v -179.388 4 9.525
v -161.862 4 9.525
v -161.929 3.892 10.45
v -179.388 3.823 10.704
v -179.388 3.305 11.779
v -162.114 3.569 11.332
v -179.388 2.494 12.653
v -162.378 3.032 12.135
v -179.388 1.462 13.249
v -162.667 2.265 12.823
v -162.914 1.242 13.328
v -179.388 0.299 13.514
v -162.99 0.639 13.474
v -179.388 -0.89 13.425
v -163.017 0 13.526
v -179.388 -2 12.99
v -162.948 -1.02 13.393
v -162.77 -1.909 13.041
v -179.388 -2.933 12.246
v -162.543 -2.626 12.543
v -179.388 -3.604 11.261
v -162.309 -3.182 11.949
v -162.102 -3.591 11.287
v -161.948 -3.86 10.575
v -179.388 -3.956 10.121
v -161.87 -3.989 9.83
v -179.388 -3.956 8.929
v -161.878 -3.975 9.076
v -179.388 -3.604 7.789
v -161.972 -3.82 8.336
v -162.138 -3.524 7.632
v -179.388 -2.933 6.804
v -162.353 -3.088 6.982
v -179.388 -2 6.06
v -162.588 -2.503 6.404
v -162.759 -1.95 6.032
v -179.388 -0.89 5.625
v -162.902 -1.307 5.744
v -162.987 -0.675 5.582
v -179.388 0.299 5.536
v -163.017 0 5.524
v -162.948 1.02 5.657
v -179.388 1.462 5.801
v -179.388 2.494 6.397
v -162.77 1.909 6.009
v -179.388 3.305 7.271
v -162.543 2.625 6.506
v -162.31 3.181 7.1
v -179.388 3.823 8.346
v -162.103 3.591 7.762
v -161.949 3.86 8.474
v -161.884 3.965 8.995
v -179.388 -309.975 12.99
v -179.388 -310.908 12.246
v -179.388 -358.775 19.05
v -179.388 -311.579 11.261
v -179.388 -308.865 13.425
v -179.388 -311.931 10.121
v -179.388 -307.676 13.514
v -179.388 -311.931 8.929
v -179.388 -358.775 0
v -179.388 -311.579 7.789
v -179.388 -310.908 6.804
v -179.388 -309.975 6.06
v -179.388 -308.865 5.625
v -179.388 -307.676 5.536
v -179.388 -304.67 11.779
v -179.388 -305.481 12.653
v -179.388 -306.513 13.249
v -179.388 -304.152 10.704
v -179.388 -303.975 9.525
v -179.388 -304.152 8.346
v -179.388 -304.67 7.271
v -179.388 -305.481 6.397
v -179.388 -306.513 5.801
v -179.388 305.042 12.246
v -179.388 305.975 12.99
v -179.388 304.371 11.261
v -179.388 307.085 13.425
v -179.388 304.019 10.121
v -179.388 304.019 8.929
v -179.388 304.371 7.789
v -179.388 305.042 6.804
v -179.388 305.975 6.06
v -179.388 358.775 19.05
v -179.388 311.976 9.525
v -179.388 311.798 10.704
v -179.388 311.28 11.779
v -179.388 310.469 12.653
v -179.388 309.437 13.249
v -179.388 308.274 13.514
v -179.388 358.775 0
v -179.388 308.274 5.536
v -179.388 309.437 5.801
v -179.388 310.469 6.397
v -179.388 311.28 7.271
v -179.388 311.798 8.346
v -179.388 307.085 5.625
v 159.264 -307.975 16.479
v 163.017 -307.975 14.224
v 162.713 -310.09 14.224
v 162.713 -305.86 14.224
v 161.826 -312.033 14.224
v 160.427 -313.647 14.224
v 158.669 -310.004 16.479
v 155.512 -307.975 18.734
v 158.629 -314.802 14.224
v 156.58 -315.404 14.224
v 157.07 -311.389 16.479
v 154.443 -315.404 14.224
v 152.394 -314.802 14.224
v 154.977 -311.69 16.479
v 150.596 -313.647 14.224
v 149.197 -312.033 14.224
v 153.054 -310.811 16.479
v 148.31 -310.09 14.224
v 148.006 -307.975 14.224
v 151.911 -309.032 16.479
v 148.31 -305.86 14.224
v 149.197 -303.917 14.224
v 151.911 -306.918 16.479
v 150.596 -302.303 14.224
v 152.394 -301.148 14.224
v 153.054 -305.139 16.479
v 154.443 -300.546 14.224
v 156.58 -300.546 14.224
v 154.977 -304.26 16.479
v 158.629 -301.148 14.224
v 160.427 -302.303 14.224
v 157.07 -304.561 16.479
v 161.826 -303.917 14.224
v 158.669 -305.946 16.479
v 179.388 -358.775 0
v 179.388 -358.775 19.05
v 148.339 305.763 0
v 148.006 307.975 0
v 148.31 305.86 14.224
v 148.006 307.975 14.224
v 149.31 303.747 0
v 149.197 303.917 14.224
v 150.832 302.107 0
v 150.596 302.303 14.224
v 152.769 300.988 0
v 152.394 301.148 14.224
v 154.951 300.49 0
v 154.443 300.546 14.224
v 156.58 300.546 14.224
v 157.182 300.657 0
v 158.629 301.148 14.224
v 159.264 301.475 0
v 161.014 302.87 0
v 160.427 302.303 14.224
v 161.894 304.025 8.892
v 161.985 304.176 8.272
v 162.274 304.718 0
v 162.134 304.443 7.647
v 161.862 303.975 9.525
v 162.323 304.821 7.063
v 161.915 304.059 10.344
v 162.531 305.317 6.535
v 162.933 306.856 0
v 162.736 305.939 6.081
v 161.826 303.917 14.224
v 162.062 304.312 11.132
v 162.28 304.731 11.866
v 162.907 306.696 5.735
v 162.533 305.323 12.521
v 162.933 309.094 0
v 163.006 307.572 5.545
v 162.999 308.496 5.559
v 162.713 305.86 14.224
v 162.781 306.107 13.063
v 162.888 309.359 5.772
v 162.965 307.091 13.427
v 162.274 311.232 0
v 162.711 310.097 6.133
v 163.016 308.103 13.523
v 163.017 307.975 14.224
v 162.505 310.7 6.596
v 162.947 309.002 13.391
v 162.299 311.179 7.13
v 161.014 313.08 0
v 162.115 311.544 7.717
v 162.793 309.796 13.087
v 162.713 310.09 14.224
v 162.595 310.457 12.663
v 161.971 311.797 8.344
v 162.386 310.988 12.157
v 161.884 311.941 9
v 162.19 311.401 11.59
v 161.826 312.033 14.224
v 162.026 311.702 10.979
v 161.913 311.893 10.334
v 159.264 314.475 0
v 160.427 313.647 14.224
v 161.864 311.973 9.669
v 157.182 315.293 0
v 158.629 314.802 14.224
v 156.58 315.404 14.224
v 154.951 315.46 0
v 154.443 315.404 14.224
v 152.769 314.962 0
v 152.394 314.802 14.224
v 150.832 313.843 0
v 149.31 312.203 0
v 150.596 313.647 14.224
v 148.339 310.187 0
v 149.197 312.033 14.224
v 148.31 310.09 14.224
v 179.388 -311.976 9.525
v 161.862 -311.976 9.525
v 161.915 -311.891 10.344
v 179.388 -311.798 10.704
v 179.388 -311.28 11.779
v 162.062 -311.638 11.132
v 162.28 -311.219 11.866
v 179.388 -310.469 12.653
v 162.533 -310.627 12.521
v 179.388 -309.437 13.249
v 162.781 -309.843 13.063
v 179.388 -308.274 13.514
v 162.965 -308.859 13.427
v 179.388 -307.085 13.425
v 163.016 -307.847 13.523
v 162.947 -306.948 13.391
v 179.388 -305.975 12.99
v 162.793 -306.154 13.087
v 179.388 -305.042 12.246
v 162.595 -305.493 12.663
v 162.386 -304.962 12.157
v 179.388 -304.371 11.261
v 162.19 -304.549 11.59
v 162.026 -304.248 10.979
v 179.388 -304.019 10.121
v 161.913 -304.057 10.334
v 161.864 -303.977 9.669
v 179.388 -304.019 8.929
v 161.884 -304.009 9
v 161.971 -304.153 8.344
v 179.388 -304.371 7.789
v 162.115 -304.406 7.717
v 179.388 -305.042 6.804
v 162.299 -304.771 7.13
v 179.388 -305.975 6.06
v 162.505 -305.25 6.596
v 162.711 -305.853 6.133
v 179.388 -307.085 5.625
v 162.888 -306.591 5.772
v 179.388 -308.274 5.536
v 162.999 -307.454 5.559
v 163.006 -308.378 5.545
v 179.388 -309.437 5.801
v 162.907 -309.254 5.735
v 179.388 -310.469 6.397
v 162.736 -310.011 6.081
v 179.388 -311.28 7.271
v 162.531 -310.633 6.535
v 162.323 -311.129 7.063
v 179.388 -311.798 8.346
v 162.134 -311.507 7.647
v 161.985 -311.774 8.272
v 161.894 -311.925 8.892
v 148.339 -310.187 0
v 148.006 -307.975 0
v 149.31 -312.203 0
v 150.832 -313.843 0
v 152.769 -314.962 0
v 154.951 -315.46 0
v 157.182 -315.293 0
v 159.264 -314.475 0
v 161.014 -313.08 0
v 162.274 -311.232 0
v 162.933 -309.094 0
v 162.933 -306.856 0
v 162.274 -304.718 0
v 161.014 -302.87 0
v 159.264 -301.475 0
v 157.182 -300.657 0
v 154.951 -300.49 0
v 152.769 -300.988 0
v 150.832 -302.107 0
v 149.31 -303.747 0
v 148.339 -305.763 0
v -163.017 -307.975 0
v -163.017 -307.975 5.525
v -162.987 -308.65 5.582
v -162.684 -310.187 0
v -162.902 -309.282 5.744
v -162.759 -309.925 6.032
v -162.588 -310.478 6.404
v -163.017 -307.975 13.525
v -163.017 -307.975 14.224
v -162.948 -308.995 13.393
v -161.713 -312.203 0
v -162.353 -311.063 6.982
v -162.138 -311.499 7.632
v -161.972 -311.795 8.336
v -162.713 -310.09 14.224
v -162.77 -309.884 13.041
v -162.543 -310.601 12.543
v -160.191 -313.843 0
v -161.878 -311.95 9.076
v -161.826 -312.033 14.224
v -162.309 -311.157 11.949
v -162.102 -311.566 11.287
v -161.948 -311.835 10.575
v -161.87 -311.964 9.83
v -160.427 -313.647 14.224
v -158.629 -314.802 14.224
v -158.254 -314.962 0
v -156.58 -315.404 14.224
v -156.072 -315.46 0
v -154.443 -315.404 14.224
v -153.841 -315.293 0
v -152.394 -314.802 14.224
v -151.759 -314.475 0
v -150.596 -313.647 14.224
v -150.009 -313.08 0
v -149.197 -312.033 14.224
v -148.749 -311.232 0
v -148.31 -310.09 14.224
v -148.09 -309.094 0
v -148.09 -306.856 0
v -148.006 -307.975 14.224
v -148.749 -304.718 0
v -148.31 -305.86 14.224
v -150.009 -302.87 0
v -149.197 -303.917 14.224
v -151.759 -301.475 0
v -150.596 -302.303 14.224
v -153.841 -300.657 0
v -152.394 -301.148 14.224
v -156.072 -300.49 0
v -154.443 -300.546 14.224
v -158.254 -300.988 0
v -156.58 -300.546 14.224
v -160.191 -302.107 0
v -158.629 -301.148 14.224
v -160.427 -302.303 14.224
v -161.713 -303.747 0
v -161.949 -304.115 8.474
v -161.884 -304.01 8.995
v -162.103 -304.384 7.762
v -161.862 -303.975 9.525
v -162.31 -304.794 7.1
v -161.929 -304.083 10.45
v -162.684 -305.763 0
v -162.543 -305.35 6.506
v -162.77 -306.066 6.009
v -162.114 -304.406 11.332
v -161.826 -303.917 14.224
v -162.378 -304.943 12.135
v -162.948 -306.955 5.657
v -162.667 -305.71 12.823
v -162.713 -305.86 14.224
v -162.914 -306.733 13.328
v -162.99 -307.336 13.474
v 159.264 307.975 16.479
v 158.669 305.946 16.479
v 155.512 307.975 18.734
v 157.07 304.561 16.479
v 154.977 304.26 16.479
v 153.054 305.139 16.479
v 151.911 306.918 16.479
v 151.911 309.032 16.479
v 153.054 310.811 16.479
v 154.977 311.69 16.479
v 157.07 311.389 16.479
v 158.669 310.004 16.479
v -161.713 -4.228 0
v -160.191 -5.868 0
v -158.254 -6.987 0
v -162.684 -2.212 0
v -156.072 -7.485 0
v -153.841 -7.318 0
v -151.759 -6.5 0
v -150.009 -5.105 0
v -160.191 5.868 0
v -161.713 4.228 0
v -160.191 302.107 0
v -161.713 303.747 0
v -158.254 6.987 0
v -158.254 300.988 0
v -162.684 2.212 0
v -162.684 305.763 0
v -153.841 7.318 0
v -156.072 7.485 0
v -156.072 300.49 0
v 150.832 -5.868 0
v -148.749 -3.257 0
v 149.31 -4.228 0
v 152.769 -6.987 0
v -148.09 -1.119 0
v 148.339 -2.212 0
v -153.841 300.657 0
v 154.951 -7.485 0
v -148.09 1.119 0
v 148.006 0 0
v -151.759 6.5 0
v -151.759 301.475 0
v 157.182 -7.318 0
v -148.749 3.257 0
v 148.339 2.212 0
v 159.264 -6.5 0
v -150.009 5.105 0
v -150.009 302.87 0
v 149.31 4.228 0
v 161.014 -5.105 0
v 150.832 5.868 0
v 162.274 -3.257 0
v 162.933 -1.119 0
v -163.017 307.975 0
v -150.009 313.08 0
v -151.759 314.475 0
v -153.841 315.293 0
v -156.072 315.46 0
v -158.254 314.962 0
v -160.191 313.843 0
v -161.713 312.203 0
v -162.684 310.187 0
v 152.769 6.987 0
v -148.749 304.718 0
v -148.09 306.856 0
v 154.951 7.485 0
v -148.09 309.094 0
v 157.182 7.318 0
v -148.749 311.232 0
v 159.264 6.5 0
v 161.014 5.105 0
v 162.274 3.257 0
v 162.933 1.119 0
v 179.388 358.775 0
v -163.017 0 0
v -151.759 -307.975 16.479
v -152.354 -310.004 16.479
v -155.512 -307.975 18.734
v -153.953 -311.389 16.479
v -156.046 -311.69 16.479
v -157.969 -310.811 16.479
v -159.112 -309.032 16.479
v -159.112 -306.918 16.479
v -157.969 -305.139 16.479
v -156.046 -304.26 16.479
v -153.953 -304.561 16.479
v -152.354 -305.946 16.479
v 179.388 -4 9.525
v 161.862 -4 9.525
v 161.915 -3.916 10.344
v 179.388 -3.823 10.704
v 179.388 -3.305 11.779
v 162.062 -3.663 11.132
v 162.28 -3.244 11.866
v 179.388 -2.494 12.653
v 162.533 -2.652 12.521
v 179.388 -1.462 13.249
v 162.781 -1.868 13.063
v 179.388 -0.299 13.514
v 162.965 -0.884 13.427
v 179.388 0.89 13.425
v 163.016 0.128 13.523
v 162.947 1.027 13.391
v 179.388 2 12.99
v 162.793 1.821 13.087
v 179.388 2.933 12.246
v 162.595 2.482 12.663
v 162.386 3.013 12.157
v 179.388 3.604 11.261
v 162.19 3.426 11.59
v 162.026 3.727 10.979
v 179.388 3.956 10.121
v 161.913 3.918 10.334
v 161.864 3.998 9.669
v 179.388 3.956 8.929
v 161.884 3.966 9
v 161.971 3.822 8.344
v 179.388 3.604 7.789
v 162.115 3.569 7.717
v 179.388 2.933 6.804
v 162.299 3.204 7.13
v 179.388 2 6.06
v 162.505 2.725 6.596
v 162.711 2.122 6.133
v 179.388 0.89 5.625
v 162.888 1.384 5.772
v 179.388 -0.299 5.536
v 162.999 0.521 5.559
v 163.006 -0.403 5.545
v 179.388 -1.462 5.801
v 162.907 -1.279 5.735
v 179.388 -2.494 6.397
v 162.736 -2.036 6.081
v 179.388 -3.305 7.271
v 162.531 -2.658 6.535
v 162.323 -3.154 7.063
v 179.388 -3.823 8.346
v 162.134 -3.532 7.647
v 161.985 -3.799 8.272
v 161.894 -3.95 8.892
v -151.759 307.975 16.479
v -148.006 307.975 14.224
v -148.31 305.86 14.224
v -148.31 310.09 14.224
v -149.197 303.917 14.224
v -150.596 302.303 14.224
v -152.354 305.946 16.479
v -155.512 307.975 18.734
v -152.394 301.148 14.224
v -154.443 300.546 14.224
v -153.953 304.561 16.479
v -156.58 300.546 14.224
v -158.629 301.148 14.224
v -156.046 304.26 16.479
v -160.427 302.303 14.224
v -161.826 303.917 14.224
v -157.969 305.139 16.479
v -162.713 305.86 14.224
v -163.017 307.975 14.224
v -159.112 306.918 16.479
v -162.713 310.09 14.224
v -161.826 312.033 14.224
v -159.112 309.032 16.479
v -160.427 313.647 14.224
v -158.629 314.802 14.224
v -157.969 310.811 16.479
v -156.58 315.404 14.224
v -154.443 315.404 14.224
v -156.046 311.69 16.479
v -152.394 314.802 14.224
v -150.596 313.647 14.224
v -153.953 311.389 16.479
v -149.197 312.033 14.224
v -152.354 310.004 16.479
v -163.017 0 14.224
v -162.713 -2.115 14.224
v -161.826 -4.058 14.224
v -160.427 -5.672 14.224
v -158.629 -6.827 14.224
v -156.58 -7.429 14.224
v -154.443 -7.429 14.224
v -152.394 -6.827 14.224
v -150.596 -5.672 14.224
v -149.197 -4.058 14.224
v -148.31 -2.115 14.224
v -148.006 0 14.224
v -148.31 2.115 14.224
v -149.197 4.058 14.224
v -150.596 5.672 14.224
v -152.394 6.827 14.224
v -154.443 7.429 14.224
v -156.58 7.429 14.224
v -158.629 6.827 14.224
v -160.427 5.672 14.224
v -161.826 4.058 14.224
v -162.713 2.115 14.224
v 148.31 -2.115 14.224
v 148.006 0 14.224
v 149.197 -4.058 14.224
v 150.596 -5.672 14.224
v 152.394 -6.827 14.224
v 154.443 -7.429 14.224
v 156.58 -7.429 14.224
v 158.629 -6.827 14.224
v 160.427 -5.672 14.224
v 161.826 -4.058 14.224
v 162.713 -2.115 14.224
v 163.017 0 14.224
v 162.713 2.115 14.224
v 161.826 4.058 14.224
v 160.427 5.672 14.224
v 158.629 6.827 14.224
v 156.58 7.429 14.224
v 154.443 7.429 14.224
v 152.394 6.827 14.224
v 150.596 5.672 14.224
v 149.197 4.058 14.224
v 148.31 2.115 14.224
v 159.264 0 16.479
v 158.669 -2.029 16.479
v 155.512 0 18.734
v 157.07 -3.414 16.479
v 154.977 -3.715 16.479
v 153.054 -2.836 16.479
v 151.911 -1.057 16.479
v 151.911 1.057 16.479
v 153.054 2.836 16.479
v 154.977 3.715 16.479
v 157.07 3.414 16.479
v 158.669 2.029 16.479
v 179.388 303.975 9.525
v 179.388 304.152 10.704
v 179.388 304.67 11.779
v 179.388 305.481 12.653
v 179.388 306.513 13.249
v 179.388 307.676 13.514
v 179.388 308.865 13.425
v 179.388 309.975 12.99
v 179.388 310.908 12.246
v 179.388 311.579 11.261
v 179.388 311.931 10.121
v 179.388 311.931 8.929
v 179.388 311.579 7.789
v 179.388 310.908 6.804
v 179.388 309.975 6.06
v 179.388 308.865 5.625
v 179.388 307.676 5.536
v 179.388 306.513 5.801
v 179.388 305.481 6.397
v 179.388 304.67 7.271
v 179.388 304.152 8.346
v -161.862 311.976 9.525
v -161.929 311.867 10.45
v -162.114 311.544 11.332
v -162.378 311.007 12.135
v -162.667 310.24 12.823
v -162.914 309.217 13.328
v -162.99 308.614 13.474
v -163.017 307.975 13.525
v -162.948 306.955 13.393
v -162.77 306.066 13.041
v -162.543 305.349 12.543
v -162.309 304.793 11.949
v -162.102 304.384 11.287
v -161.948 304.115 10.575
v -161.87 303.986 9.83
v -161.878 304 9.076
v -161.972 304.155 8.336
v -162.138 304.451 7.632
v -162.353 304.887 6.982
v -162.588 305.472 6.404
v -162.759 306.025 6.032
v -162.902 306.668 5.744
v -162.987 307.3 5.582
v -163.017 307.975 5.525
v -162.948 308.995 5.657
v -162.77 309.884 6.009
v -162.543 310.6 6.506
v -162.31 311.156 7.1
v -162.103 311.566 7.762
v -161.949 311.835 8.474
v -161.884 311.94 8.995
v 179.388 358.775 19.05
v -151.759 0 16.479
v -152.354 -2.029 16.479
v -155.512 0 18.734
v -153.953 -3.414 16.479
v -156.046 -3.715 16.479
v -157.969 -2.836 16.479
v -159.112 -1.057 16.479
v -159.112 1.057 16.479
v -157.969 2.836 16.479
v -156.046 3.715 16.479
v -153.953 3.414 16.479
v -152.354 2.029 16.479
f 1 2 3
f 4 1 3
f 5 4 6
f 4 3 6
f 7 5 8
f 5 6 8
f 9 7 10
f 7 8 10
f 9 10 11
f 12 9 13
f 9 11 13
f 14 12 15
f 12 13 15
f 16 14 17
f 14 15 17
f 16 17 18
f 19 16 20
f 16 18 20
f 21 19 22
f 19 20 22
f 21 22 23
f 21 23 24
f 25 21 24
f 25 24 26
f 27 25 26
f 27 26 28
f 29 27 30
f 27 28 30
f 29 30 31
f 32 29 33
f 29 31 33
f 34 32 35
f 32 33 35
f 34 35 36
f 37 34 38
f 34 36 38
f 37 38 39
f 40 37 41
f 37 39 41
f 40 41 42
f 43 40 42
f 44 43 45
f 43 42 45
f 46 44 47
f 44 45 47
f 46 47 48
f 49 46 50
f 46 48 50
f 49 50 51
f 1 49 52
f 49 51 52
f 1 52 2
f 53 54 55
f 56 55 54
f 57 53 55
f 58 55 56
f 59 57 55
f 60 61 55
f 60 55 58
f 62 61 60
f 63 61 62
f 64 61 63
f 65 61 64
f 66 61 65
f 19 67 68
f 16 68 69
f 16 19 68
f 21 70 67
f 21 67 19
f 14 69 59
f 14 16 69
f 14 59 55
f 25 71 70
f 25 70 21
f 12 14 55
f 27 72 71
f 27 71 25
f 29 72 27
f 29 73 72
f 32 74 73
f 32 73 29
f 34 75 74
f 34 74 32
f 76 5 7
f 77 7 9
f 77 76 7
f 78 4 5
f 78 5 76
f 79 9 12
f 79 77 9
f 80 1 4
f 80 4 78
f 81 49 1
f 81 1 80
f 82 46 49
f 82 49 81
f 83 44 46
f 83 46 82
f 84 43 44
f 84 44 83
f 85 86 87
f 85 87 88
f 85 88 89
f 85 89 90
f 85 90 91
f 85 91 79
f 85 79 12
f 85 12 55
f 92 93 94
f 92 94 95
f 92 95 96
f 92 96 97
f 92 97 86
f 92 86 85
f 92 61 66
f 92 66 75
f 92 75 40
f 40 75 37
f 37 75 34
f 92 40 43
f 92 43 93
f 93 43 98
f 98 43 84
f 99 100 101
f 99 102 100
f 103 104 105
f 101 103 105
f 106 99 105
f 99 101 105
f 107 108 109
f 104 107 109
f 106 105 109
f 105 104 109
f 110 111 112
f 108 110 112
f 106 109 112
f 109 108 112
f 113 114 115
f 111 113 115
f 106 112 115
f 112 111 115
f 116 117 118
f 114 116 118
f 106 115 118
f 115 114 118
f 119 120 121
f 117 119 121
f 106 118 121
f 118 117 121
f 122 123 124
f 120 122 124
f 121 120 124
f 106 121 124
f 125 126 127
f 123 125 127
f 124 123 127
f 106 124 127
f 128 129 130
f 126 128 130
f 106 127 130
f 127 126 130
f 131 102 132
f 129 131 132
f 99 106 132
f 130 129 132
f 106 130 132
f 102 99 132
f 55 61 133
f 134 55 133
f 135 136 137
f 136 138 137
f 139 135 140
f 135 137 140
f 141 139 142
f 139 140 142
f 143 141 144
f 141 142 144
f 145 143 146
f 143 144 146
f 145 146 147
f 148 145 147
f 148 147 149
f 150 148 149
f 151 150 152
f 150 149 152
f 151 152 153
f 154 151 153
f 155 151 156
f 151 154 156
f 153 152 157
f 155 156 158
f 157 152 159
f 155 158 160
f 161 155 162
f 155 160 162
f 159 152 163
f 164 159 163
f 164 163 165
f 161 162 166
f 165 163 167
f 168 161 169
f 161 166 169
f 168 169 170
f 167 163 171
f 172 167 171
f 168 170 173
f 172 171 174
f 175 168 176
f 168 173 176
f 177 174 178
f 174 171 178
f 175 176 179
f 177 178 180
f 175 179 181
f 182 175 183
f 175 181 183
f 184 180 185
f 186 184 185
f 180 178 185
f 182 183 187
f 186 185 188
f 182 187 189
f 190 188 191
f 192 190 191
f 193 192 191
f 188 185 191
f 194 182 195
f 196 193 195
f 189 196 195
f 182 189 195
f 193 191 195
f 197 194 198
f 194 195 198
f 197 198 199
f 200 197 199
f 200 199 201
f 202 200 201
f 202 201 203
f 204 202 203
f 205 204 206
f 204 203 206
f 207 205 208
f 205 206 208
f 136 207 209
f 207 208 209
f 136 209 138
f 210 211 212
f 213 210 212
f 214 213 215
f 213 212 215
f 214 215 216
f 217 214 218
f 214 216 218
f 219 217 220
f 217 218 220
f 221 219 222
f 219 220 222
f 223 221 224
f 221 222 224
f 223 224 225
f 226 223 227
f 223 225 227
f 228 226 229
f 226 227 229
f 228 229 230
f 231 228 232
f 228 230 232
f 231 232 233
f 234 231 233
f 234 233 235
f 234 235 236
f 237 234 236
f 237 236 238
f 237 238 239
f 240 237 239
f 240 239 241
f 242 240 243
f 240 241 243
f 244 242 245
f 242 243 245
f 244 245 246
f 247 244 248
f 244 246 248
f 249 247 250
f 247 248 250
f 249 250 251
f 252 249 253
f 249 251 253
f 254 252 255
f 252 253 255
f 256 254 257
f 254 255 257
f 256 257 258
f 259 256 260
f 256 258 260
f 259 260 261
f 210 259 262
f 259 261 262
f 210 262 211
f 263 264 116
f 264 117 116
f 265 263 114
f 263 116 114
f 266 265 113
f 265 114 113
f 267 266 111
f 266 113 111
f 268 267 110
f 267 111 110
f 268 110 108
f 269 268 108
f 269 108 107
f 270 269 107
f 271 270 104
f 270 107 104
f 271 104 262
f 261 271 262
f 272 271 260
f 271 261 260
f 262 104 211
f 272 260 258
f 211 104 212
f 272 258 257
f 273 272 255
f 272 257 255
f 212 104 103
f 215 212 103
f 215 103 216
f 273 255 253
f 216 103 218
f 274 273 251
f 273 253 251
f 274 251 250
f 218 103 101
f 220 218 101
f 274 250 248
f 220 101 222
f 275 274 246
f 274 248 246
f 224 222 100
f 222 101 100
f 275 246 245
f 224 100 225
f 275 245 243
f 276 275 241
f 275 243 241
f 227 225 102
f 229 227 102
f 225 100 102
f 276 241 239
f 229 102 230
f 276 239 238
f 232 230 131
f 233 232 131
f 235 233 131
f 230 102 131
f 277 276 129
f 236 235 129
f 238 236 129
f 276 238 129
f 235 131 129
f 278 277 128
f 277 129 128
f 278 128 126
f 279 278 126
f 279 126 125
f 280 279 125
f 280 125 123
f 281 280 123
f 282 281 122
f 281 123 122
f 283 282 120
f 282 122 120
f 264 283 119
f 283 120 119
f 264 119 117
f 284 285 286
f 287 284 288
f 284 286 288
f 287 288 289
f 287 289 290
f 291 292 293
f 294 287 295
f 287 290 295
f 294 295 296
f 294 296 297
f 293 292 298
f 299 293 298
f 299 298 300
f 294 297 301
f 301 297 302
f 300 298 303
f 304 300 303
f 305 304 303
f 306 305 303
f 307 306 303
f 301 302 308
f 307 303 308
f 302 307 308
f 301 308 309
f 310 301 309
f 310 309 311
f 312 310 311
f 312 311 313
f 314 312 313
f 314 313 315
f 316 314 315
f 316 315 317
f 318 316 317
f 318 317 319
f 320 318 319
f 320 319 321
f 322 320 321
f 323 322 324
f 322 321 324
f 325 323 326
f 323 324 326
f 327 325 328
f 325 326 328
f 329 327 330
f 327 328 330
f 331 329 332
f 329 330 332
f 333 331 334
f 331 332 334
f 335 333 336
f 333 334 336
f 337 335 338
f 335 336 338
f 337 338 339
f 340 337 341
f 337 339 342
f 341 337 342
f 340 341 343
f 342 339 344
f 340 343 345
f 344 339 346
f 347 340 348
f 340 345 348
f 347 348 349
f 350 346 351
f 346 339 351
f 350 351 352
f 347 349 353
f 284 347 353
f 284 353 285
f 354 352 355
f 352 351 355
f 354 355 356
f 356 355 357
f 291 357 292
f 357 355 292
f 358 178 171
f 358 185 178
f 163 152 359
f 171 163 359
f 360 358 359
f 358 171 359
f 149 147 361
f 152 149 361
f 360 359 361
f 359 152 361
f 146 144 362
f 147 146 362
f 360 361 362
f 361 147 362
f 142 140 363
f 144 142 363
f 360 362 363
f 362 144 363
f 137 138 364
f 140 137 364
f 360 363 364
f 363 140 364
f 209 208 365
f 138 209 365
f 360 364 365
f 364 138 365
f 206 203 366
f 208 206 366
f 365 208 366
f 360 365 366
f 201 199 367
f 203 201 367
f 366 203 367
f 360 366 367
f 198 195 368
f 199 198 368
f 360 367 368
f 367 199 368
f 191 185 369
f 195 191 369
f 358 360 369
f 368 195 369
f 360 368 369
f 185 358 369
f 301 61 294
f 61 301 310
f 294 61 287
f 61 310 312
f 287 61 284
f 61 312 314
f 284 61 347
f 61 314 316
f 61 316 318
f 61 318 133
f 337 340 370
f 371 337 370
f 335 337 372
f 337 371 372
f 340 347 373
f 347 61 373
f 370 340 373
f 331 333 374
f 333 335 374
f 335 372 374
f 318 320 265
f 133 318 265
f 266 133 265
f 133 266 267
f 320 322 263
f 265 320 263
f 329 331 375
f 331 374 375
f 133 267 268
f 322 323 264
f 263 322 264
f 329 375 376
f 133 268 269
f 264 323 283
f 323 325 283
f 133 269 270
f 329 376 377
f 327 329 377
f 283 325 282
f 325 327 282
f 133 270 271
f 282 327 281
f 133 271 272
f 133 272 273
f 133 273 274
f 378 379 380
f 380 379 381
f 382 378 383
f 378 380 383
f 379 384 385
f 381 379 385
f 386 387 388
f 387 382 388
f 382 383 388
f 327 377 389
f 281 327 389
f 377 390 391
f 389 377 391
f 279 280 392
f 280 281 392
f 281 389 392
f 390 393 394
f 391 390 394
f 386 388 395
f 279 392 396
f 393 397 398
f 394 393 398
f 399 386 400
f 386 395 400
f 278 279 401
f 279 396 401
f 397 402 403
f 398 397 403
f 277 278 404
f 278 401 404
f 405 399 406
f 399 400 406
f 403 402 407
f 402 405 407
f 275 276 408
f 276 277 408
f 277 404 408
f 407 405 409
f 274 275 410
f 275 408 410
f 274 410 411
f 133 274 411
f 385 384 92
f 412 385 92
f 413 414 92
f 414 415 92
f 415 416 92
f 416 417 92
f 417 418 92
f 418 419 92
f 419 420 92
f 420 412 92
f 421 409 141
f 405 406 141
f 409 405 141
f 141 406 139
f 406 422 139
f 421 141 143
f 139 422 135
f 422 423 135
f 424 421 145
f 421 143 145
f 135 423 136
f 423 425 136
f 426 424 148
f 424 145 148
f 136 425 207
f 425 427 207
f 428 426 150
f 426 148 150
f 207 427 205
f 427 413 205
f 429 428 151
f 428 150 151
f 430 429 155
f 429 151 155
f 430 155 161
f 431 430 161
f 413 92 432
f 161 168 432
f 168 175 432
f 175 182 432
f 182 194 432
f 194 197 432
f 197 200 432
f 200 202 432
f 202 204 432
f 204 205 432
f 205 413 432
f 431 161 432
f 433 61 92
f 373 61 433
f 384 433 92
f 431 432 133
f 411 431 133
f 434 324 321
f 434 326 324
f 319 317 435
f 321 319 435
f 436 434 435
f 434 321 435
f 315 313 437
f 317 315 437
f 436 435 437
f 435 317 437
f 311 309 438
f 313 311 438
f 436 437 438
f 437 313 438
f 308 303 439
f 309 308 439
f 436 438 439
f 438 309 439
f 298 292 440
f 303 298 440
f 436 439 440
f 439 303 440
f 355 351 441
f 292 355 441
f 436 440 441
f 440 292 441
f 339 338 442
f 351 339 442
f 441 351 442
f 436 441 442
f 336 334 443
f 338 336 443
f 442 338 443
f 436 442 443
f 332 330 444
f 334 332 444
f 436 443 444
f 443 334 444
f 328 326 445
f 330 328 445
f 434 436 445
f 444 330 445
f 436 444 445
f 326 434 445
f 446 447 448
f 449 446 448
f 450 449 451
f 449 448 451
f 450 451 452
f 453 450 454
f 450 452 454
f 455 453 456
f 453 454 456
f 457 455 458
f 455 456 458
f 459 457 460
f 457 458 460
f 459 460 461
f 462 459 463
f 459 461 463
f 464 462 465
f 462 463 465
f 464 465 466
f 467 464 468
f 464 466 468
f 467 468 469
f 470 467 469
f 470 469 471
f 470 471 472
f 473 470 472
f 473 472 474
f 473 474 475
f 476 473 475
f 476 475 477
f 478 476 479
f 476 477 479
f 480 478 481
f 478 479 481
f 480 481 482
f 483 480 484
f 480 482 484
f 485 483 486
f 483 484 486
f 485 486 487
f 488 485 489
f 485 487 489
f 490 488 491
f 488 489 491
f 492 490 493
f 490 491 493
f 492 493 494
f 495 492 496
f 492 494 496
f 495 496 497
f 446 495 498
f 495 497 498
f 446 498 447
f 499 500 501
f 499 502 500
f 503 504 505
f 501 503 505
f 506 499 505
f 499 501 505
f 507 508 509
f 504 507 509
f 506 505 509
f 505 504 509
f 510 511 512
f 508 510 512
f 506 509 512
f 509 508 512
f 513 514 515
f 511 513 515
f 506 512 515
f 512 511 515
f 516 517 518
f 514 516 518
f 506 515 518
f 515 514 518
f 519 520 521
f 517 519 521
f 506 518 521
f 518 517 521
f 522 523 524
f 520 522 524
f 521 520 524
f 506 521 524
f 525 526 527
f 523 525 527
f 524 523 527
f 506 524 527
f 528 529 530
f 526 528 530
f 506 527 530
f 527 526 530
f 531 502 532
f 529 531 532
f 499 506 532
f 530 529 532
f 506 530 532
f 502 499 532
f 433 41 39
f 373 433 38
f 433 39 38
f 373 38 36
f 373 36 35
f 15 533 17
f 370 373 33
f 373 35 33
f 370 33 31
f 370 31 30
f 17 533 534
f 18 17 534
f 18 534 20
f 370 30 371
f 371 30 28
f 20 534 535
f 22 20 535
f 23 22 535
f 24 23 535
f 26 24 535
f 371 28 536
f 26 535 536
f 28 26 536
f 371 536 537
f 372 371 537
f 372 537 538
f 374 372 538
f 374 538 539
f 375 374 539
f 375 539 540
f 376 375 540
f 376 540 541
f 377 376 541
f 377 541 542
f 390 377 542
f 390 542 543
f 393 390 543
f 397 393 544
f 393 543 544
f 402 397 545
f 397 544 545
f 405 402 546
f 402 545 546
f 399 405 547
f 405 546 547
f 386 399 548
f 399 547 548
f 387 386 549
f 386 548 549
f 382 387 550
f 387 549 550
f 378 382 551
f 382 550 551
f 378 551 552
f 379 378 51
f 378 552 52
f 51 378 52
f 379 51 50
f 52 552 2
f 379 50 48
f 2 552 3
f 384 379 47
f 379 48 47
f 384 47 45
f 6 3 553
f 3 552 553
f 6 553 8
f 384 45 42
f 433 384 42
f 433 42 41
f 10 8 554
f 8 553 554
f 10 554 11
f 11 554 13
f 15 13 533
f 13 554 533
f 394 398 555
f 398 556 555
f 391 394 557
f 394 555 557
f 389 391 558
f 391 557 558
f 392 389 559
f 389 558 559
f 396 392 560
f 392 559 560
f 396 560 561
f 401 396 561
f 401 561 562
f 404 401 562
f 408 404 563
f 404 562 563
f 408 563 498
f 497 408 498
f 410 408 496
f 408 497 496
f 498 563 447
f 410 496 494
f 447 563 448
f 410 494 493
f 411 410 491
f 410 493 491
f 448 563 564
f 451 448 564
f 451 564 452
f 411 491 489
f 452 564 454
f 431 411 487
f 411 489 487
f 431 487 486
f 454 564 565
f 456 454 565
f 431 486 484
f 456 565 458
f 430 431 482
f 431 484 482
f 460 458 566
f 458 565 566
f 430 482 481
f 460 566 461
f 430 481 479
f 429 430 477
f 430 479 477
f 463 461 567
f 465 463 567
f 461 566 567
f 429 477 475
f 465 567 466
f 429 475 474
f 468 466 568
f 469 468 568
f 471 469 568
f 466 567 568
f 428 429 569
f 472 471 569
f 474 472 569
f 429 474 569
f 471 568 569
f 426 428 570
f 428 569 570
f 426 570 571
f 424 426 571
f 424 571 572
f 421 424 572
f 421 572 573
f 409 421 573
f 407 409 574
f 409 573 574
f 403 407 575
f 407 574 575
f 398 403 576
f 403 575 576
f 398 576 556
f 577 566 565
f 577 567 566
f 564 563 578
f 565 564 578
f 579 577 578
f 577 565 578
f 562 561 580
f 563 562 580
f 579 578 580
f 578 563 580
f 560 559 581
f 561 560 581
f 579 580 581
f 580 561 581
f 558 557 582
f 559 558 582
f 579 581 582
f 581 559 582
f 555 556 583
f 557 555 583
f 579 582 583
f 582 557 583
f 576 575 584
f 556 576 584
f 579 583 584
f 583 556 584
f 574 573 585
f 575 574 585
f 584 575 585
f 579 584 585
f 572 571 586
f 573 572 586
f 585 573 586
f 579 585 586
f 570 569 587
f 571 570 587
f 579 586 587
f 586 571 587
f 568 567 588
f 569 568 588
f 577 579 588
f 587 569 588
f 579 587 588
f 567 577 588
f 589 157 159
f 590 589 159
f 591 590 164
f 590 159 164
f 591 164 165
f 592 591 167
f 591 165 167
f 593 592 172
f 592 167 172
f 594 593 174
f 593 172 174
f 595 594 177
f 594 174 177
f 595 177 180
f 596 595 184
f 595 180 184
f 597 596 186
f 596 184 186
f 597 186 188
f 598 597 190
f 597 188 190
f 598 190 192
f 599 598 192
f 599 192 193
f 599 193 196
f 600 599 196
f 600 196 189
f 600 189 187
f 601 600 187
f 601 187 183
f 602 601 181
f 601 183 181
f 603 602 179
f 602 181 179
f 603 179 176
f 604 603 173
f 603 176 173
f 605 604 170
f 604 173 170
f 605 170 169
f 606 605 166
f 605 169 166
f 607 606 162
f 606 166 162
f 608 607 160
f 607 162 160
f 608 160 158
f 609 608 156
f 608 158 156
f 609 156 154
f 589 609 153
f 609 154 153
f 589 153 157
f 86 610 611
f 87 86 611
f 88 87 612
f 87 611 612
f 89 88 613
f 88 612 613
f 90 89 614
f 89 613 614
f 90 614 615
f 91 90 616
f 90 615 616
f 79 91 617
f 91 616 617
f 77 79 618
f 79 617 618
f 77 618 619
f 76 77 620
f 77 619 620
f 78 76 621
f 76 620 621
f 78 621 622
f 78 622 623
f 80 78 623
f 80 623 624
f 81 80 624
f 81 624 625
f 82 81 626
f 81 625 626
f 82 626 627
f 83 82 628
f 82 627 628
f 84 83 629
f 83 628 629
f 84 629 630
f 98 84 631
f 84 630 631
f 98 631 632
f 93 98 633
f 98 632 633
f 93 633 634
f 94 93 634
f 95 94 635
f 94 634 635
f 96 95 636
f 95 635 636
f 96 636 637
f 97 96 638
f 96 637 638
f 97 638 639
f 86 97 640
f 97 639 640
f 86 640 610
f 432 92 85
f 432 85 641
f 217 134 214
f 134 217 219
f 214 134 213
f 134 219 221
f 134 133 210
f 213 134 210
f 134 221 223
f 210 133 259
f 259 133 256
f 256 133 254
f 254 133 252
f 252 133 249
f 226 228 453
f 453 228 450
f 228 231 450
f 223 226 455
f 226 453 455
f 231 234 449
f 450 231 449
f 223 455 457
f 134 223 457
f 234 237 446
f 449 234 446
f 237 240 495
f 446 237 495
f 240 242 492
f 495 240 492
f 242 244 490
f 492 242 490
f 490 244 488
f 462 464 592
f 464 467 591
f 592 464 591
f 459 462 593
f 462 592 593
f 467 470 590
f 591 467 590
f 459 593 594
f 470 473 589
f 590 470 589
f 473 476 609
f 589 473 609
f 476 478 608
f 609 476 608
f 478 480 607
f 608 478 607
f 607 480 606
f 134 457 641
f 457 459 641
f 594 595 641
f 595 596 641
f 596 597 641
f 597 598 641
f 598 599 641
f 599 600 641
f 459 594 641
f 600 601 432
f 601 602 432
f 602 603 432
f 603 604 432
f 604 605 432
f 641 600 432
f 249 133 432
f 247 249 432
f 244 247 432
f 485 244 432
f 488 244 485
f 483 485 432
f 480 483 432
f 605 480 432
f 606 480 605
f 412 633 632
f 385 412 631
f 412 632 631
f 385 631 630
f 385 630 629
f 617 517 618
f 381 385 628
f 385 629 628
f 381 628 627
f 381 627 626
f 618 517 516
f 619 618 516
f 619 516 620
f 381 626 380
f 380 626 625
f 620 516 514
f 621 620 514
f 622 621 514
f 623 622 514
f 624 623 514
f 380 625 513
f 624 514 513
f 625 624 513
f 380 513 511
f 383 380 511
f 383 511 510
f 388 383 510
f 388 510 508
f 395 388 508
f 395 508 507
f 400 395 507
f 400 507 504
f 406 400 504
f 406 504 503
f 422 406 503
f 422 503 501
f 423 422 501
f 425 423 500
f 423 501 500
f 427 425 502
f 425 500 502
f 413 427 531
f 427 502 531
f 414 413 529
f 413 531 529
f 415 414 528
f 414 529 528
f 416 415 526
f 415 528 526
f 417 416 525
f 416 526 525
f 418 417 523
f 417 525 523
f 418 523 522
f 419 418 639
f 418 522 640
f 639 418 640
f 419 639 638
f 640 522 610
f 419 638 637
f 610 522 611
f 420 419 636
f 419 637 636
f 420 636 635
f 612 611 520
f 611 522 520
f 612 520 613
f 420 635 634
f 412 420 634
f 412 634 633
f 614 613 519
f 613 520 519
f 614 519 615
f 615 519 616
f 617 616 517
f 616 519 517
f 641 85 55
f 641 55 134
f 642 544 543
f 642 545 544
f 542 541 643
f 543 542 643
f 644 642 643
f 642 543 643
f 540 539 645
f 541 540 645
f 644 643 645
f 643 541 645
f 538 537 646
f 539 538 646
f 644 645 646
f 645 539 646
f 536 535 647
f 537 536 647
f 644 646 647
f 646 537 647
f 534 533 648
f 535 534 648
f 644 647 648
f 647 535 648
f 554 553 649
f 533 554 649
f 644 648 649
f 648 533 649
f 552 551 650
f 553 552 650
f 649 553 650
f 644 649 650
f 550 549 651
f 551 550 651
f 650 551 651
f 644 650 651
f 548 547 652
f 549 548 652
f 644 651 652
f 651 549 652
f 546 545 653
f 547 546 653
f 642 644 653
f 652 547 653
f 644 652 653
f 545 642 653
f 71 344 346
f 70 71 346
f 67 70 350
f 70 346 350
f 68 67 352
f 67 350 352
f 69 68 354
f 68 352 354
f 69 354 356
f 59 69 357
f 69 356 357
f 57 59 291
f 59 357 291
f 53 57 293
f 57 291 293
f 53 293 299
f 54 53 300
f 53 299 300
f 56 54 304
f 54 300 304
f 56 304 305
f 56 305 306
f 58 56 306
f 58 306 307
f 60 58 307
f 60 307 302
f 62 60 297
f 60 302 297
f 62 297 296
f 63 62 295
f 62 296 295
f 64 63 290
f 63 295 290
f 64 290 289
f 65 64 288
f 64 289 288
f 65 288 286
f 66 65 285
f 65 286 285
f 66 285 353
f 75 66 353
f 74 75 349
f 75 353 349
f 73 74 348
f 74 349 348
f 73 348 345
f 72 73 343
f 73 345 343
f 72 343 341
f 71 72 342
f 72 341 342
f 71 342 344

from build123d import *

# Parameters (mm, degrees)
F0_W     = 358.775
F0_H     = 717.55
F1_DEPTH = 19.05
F3_D     = 8.001
F3_DEPTH = 25.4
F3_TIP   = 2.4037429064
F5_D     = 8.001
F5_DEPTH = 25.4
F5_TIP   = 2.4037429064
F7_D     = 15.0114
F7_DEPTH = 14.224
F7_TIP   = 4.5098795482


with BuildPart() as f1:
    # F0 (on Top) → F1 (new body)
    with BuildSketch(Plane.XY):
        Rectangle(F0_W, F0_H)
    extrude(amount=F1_DEPTH)

    # F3
    with Locations(Plane(origin=(-179.3875, 0, 0), x_dir=(0, -1, 0), z_dir=(-1, 0, 0))):
        with Locations((-307.975, 9.525), (0, 9.525), (307.975, 9.525)):
            Hole(F3_D / 2, depth=F3_DEPTH)
            with Locations((0, 0, -(F3_DEPTH + F3_TIP / 2))):  # 118° drill point
                Cone(0, F3_D / 2, F3_TIP, mode=Mode.SUBTRACT)

    # F5
    with Locations(Plane.YZ.offset(179.3875)):
        with Locations((-307.975, 9.525), (0, 9.525), (307.975, 9.525)):
            Hole(F5_D / 2, depth=F5_DEPTH)
            with Locations((0, 0, -(F5_DEPTH + F5_TIP / 2))):  # 118° drill point
                Cone(0, F5_D / 2, F5_TIP, mode=Mode.SUBTRACT)

    # F7
    with Locations(Plane(origin=(0, 0, 0), x_dir=(1, 0, 0), z_dir=(0, 0, -1))):
        with Locations((-155.5115, 307.975), (155.5115, 307.975), (155.5115, 0), (-155.5115, 0), (-155.5115, -307.975), (155.5115, -307.975)):
            Hole(F7_D / 2, depth=F7_DEPTH)
            with Locations((0, 0, -(F7_DEPTH + F7_TIP / 2))):  # 118° drill point
                Cone(0, F7_D / 2, F7_TIP, mode=Mode.SUBTRACT)


solid = f1.part
